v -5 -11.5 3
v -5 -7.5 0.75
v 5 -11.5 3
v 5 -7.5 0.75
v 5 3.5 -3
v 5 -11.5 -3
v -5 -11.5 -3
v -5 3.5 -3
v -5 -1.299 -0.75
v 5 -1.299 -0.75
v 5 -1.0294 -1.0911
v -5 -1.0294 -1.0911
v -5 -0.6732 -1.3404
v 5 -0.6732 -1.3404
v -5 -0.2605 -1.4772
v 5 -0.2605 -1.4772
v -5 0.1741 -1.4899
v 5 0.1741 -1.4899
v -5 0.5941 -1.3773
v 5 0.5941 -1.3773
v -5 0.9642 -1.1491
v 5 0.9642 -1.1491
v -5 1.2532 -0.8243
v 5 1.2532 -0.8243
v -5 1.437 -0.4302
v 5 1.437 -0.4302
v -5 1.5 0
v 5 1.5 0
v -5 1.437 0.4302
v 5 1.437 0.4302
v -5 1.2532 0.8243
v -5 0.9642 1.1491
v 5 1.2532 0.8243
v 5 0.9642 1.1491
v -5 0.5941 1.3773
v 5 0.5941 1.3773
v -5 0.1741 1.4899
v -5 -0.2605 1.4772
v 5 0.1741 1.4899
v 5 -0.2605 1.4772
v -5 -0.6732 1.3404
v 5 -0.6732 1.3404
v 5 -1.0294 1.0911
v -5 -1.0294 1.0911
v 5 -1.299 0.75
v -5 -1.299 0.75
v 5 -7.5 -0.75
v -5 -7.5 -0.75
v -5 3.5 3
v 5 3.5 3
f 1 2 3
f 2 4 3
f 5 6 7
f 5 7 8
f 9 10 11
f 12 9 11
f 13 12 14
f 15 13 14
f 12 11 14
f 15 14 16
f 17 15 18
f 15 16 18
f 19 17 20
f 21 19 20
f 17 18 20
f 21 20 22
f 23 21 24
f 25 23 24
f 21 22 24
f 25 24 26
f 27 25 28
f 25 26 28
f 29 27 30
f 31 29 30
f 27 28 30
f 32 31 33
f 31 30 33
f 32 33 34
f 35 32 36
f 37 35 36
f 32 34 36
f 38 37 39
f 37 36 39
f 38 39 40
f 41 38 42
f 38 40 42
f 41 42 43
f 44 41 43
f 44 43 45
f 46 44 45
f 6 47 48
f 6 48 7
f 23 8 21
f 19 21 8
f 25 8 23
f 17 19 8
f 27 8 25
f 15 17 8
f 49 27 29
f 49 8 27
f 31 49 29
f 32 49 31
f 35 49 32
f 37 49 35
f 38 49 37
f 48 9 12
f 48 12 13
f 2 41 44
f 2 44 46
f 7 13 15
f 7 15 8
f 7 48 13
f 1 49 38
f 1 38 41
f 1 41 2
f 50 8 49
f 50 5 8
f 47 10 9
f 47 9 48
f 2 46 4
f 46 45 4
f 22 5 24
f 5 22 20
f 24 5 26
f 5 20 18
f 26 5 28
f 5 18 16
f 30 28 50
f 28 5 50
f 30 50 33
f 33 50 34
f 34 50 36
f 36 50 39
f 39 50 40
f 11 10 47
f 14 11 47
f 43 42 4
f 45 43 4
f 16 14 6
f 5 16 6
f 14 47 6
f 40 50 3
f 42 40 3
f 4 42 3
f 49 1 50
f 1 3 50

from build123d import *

# Parameters (mm, degrees)
PAD_DEPTH = 5


with BuildPart() as part:
    # Sketch → Pad (new body, symmetric)
    with BuildSketch(Plane.YZ):
        with BuildLine():
            ThreePointArc((-1.299038, -0.75), (1.5, 0), (-1.299038, 0.75))
            Line((-1.299038, 0.75), (-7.5, 0.75))
            Line((-7.5, 0.75), (-11.5, 3))
            Line((-11.5, 3), (3.5, 3))
            Line((3.5, -3), (3.5, 3))
            Line((-11.5, -3), (3.5, -3))
            Line((-7.5, -0.75), (-11.5, -3))
            Line((-1.299038, -0.75), (-7.5, -0.75))
        make_face()
    extrude(amount=PAD_DEPTH, both=True)


solid = part.part
